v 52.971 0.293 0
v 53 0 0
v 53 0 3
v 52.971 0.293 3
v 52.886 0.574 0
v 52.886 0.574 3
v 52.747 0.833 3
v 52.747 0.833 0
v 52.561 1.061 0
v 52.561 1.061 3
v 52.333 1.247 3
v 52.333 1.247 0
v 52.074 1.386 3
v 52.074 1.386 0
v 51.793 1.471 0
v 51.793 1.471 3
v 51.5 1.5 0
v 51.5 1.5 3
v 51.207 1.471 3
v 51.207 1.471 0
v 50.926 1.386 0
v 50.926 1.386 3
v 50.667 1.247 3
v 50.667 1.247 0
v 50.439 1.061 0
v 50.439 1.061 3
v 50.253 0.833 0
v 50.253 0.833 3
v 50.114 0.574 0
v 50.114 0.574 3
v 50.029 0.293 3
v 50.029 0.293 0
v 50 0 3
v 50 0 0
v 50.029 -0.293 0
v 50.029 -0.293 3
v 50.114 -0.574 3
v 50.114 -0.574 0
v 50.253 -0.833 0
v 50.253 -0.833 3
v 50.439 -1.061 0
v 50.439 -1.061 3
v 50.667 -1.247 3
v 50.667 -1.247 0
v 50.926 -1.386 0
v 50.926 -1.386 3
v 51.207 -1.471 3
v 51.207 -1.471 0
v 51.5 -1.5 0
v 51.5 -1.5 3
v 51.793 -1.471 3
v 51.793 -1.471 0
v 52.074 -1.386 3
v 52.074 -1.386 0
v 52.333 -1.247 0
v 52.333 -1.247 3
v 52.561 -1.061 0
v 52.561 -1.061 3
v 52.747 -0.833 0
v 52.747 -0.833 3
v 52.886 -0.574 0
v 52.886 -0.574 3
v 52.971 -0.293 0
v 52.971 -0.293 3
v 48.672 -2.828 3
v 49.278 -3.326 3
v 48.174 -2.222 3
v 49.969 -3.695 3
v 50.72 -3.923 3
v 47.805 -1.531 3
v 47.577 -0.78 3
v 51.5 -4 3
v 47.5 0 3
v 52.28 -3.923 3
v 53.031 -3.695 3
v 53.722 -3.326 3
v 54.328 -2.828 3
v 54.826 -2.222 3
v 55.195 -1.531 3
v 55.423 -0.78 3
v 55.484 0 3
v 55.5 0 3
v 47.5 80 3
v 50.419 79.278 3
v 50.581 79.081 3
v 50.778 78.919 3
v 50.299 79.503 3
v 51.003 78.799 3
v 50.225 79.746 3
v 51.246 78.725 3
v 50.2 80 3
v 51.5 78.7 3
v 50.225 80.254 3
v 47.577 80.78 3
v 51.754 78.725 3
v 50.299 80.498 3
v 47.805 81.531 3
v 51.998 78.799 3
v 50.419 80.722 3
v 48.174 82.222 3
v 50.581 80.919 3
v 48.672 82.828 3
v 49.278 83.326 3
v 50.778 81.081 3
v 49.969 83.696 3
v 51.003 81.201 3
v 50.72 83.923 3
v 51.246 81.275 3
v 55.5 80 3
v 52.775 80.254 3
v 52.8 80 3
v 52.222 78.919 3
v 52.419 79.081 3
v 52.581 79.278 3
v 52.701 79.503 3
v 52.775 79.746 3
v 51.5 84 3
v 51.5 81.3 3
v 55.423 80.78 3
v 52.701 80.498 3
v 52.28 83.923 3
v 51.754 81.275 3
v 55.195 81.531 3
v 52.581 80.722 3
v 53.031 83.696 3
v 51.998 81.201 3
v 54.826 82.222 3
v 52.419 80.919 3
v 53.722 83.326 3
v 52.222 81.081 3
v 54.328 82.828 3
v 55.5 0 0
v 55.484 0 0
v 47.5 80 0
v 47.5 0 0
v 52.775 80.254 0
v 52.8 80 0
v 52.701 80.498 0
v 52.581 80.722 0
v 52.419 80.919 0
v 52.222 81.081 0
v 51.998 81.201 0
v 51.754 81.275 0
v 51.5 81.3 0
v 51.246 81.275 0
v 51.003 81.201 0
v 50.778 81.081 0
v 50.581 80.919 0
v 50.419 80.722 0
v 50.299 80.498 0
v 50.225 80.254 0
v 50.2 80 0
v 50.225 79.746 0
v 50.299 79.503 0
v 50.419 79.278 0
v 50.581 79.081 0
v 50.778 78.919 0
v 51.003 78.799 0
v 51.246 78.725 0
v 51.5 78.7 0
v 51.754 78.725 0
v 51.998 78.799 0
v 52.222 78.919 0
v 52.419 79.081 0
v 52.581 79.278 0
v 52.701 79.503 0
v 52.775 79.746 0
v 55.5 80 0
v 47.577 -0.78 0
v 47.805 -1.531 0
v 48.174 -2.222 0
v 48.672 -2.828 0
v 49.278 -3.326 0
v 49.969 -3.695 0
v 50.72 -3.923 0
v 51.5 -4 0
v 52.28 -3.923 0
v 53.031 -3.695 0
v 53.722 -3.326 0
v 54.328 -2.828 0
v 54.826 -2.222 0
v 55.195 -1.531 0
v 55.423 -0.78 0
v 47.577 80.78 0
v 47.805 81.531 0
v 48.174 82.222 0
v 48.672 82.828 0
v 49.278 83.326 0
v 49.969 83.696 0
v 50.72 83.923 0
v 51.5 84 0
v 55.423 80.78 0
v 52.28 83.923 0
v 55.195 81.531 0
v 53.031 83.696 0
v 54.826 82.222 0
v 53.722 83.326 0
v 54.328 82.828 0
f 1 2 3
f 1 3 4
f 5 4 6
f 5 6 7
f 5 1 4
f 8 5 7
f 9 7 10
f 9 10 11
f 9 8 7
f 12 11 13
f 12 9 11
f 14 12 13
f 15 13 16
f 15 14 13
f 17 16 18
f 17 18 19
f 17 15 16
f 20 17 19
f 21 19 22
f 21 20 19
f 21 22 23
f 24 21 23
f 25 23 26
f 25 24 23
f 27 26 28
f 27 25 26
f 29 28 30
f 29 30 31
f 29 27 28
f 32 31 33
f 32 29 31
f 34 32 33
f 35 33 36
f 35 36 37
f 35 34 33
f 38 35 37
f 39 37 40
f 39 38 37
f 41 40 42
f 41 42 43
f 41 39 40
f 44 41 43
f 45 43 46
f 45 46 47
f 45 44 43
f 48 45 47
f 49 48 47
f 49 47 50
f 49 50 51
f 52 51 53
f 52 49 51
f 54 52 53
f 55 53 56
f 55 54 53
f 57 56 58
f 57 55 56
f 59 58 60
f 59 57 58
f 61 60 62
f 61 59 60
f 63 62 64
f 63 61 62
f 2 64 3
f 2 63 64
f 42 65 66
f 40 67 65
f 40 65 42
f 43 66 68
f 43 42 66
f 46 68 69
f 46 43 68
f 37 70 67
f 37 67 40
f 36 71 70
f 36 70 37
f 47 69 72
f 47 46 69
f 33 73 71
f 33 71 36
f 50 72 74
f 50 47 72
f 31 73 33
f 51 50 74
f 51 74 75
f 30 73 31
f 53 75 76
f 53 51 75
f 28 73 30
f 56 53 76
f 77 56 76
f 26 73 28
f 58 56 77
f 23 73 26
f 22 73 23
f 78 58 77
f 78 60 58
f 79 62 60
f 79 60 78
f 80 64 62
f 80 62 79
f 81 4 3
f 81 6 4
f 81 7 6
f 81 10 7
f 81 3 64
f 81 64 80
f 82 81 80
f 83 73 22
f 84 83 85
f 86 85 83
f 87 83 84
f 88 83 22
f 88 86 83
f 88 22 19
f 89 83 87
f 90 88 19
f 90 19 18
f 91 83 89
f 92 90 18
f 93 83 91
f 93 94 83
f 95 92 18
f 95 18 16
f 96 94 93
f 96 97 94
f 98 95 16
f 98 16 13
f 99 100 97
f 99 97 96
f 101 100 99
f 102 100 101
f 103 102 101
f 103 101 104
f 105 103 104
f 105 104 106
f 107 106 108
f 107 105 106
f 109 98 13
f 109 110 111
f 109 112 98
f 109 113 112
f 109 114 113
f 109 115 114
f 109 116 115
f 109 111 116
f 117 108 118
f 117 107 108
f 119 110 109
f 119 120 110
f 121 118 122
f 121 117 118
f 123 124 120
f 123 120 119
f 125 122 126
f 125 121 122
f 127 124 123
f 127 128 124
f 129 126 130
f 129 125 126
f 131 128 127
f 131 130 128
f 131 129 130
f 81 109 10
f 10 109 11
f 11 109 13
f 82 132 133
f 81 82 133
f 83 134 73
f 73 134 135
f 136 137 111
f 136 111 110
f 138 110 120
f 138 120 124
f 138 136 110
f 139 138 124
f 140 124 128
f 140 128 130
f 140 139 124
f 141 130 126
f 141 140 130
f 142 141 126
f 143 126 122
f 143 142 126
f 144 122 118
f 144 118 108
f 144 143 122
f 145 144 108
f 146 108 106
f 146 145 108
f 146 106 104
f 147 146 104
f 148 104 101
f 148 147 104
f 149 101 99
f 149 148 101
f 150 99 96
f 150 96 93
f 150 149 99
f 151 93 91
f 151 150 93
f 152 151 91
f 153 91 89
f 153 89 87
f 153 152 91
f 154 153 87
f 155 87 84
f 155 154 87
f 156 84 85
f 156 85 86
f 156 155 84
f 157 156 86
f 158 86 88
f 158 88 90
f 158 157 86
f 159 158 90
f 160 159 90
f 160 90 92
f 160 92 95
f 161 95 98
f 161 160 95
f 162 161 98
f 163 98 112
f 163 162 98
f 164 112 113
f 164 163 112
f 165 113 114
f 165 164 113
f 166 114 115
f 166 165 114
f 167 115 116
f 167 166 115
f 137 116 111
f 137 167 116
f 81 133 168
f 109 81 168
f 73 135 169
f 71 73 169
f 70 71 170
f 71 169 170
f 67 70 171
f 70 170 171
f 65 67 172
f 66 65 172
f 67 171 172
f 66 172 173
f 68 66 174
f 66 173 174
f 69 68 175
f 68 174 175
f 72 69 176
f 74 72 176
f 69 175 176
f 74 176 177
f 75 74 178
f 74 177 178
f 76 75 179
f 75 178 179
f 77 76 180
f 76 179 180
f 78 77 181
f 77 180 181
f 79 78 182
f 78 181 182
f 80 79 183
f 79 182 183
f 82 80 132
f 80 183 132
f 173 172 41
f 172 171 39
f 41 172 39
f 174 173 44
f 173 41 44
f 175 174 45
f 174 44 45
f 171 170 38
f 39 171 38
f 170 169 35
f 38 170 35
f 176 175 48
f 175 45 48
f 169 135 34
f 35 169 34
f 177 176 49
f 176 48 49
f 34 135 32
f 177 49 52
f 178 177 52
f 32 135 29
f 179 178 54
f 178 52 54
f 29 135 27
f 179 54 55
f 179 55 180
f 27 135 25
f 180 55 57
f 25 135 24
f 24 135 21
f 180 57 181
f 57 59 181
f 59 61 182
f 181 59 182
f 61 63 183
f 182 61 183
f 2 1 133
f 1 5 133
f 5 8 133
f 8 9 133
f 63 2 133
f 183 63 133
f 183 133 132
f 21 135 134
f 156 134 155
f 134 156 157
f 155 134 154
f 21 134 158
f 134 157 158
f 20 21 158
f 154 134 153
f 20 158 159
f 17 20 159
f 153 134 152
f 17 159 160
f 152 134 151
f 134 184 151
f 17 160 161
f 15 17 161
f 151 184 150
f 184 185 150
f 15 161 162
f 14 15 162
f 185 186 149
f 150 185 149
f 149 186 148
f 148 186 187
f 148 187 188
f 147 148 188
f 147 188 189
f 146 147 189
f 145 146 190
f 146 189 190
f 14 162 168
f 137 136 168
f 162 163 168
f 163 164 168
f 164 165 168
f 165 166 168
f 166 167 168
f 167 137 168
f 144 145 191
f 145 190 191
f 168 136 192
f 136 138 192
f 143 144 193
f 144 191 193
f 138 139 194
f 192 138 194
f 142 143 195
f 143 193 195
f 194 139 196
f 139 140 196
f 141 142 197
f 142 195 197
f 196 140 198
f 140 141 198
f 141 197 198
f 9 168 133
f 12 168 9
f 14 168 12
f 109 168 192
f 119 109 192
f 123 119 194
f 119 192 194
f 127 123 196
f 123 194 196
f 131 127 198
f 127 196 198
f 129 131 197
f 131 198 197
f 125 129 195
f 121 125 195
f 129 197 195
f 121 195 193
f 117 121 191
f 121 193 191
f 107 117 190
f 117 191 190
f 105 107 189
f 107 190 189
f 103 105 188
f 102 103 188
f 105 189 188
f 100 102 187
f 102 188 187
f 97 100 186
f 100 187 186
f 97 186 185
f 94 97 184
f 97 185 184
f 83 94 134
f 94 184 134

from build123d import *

# Parameters (mm, degrees)
MODEL_R             = 1.5
MODEL_R_2           = 1.3
BOSS_EXTRUDE1_DEPTH = 3


with BuildPart() as part:
    # Model → Boss-Extrude1 (new body)
    with BuildSketch(Plane.XY):
        with BuildLine():
            Line((47.500099999, 80.00015), (47.500099999, 4.9999e-05))
            ThreePointArc((47.500099999, 4.9999e-05), (51.499999999, -3.99985), (55.499899998, 4.9999e-05))
            Line((55.499899998, 4.9999e-05), (55.483779921, 0))
            Line((55.483779921, 0), (55.499899998, 80.000050001))
            ThreePointArc((55.499899998, 80.000050001), (51.500049998, 84), (47.500099999, 80.00015))
        make_face()
        with Locations((51.500099998, 4.9998e-05)):
            Circle(MODEL_R, mode=Mode.SUBTRACT)
        with Locations((51.500099998, 80.000049998)):
            Circle(MODEL_R_2, mode=Mode.SUBTRACT)
    extrude(amount=BOSS_EXTRUDE1_DEPTH)


solid = part.part
